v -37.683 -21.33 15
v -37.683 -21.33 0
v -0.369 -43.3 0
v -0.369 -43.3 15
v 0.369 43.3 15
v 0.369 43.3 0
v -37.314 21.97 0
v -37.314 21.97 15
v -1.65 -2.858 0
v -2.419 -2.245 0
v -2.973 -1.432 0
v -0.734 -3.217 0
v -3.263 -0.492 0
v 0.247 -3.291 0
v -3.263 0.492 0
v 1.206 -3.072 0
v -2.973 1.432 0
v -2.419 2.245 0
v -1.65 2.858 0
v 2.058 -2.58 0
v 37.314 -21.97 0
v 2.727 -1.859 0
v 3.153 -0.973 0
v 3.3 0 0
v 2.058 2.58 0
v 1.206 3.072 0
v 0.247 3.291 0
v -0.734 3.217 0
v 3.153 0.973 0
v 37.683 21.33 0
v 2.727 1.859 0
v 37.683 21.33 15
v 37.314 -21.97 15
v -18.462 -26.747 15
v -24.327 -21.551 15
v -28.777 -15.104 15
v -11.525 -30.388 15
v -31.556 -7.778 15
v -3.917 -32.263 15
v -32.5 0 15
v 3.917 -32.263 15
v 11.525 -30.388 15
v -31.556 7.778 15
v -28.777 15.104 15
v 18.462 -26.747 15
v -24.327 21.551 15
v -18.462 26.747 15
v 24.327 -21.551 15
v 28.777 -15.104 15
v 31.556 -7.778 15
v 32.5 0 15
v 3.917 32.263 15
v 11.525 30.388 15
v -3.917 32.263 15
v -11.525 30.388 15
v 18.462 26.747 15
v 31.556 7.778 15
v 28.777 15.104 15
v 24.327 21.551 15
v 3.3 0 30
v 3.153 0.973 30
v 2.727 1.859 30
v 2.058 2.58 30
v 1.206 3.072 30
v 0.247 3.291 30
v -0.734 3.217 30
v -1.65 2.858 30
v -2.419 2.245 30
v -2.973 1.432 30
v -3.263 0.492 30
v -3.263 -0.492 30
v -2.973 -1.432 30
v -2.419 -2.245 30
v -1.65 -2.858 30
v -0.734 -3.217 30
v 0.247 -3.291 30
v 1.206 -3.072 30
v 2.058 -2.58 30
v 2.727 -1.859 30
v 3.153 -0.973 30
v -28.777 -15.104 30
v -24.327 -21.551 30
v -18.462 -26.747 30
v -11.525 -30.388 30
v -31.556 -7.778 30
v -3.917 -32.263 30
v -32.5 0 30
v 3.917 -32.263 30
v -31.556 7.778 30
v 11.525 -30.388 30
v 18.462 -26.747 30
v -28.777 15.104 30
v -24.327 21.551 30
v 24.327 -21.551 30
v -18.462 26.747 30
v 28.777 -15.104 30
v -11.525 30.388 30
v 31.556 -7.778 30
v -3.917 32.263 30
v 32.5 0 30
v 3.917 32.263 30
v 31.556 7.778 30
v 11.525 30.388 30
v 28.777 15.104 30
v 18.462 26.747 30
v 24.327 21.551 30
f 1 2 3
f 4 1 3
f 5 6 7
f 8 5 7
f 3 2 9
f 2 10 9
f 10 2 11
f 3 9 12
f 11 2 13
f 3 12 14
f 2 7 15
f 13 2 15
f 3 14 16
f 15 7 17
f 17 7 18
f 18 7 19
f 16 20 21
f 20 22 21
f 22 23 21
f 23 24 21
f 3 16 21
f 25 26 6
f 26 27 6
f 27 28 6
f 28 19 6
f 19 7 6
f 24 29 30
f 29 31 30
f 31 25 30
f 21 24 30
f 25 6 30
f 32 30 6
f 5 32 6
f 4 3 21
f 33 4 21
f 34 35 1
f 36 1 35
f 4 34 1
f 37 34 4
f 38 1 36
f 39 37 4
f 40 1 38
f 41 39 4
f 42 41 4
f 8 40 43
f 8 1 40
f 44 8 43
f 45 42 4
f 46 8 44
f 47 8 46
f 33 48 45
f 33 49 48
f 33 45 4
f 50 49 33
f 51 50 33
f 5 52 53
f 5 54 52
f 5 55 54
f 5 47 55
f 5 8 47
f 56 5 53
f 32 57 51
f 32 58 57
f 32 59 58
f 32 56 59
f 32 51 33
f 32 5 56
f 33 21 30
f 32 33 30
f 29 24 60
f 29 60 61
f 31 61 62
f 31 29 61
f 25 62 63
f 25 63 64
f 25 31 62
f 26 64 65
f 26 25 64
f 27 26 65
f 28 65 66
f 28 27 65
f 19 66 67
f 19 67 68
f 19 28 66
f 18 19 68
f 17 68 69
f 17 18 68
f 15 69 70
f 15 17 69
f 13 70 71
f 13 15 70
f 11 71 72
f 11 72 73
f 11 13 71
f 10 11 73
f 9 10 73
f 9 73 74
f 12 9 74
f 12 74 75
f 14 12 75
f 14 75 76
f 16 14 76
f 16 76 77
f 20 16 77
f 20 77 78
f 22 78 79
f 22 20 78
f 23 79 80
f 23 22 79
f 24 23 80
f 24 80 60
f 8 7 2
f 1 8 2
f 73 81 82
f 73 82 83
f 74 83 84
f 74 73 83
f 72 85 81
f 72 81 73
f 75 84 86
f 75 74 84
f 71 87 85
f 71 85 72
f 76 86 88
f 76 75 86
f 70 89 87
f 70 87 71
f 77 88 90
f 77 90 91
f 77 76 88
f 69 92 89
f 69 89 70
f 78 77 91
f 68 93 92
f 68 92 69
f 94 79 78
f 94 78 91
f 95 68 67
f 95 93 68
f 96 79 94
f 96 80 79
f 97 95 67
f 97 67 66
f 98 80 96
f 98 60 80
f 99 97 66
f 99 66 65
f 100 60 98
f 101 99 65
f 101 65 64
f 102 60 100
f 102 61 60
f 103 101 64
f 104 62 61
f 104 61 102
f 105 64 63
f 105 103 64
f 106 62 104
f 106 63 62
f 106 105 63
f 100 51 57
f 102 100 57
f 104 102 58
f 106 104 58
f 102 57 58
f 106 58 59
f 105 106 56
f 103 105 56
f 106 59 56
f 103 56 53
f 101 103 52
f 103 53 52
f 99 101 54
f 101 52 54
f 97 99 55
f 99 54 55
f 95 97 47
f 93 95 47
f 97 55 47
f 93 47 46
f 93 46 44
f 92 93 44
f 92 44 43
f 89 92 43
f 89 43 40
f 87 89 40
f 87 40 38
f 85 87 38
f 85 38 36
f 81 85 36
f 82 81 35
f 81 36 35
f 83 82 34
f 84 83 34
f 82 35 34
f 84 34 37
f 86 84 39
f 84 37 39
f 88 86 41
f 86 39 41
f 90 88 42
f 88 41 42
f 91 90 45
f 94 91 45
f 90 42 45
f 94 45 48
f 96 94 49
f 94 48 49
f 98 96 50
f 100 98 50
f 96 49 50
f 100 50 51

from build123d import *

# Parameters (mm, degrees)
F1_DEPTH = 15
F2_R     = 32.5
F3_DEPTH = 15
F4_R     = 3.3
F5_DEPTH = 30


# Not quite as in the source:
# - a feature names something its author has since deleted; it is built from what else it names


with BuildPart() as f1:
    # F0 (on Top) → F1 (new body)
    with BuildSketch(Plane.XY):
        Polygon((0.369179663, 43.2996963774), (-37.3140472075, 21.9695671555), (-37.6832268705, -21.330129222), (-0.369179663, -43.2996963774), (37.3140472075, -21.9695671555), (37.6832268705, 21.330129222), align=None)
    extrude(amount=F1_DEPTH)

    # F2 (on face) → F3 (join)
    with BuildSketch(Plane.XY.offset(15)):
        Circle(F2_R)
    extrude(amount=F3_DEPTH)


with BuildPart() as f5:
    # F4 (on Top) → F5 (new body)
    with BuildSketch(Plane.XY):
        Circle(F4_R)
    extrude(amount=F5_DEPTH)


with BuildPart() as f1_1:
    add(f1.part)

    # F6: cut F5
    add(f5.part, mode=Mode.SUBTRACT)


solid = f1_1.part
